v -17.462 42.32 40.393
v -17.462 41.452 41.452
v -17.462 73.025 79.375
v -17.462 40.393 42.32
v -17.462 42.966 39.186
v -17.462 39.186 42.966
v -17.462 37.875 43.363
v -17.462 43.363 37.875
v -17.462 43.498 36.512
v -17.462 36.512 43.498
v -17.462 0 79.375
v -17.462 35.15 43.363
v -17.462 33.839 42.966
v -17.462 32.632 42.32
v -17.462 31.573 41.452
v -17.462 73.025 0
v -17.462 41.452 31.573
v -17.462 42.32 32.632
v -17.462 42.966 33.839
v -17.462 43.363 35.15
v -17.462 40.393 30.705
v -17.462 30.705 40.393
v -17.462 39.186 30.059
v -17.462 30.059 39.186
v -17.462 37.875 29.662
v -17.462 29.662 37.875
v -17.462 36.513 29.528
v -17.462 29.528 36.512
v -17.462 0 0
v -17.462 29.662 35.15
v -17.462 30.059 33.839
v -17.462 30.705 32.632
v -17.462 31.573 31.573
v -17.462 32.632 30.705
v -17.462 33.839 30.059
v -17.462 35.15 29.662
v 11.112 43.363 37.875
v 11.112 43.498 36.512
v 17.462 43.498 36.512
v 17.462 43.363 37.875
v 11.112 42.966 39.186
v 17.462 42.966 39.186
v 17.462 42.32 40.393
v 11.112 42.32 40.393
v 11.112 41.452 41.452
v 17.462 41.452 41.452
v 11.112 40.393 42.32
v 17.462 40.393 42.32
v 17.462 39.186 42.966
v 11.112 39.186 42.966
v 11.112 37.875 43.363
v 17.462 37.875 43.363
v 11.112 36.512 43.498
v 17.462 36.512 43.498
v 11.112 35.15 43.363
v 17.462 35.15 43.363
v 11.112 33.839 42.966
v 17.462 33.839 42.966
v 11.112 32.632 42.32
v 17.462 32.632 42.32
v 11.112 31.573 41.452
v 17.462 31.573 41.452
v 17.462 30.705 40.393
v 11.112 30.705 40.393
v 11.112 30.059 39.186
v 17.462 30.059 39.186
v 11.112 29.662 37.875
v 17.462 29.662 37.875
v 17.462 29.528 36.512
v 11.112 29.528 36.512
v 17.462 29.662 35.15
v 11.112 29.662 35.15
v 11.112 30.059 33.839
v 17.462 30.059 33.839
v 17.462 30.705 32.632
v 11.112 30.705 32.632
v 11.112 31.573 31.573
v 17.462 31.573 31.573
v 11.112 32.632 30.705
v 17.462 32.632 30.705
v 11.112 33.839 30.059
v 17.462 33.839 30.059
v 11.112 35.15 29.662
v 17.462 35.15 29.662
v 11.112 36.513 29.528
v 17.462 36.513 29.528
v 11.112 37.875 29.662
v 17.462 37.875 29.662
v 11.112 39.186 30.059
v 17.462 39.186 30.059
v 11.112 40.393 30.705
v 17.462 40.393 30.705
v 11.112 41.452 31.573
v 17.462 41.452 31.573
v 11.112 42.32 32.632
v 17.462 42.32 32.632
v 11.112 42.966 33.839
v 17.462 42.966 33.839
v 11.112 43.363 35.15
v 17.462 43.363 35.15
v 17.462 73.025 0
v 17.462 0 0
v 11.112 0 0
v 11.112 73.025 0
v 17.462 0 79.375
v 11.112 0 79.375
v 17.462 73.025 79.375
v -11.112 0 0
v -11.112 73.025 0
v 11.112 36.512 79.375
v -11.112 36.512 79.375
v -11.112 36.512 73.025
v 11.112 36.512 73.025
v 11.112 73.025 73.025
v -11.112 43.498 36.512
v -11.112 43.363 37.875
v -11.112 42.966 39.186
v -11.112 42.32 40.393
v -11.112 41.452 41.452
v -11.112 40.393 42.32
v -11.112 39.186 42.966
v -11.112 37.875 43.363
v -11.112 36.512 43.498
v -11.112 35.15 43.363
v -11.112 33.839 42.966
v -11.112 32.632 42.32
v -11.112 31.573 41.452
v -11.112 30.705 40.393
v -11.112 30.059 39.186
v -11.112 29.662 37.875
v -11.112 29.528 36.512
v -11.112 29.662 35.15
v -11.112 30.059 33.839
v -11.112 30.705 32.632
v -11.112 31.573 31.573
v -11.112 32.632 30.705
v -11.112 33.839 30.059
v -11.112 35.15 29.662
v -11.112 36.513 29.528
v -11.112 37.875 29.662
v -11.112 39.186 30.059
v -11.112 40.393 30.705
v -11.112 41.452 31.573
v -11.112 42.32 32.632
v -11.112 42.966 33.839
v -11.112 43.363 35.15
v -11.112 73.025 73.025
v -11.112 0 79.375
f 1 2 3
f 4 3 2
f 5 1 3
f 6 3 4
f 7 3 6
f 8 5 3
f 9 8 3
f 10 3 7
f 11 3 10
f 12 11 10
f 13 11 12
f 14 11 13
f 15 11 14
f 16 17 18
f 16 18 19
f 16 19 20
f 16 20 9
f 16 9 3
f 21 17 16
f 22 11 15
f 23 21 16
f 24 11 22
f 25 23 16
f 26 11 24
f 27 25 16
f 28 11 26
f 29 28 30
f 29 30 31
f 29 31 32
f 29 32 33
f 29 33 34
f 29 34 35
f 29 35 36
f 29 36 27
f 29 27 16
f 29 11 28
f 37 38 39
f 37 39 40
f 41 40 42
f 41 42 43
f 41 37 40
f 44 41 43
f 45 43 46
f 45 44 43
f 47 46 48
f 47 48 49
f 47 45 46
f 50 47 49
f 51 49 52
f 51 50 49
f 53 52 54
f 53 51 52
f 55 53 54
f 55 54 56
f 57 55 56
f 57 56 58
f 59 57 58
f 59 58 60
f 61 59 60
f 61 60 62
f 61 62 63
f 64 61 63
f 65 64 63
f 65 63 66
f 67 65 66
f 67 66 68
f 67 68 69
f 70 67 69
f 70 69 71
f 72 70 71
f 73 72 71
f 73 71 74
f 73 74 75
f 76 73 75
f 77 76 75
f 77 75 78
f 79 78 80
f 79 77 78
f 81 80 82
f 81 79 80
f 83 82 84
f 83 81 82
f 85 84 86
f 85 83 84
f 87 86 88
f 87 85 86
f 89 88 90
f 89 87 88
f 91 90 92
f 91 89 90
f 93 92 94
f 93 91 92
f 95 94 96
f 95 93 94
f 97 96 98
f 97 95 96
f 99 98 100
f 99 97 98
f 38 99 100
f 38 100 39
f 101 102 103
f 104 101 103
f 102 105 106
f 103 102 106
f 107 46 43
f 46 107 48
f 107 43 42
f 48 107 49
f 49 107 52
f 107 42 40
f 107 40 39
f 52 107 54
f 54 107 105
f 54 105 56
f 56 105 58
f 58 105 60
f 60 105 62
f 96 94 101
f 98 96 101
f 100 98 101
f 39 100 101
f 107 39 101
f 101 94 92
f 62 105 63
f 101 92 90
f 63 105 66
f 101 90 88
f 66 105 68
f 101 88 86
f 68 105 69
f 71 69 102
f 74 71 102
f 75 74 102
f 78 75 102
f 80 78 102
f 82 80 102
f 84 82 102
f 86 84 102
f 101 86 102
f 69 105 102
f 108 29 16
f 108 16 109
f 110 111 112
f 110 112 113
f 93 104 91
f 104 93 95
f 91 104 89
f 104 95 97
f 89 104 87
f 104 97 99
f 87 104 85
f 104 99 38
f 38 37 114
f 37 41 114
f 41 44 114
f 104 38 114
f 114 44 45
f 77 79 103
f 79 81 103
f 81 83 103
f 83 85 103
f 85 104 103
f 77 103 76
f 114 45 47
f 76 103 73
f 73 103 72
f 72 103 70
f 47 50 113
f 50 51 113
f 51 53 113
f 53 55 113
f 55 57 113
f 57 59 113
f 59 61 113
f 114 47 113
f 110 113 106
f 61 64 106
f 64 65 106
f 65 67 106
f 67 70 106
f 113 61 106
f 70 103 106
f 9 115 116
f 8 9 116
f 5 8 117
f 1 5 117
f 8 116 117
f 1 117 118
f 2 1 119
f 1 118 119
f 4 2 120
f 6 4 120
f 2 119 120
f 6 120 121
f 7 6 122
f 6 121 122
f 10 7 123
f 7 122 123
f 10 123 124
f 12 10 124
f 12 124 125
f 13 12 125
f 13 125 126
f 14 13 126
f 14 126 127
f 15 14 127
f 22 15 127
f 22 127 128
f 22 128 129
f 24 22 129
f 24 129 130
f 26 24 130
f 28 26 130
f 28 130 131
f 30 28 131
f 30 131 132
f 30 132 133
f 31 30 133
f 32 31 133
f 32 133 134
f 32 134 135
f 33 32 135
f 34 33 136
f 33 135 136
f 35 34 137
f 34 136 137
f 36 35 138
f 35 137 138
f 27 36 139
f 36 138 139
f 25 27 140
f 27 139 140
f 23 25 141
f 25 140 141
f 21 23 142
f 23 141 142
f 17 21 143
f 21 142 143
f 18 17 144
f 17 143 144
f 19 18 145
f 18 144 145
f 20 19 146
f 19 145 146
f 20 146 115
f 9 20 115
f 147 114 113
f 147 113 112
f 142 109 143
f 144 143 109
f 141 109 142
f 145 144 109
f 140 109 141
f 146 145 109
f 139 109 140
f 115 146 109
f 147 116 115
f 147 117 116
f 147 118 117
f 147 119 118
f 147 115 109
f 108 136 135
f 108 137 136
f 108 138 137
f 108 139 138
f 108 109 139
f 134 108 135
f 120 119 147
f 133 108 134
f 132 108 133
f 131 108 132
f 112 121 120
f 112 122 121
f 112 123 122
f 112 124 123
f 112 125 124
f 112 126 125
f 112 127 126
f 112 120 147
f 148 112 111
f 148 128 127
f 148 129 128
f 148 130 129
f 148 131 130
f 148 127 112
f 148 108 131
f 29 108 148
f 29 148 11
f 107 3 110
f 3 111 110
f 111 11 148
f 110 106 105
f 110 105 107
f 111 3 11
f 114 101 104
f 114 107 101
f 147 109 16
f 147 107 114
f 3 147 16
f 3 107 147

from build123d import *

# Parameters (mm, degrees)
F1_DEPTH = 73.025
F2_R     = 6.985
F3_DEPTH = 25.4
F5_W     = 22.225
F5_H     = 36.5125
F6_DEPTH = 25.4


with BuildPart() as f1:
    # F0 (on Front) → F1 (new body)
    with BuildSketch(Plane.XZ):
        Polygon((-17.4625, 0), (-11.1125, 0), (-11.1125, 73.025), (0, 73.025), (0, 79.375), (-17.4625, 79.375), align=None)
    extrude(amount=-F1_DEPTH)

    # F2 (on face) → F3 (cut)
    with BuildSketch(Plane.YZ.offset(-11.1125)):
        with Locations((36.5125, 36.5125)):
            Circle(F2_R)
    extrude(amount=-F3_DEPTH, mode=Mode.SUBTRACT)

    # F4: F1 across plane


with BuildPart() as f1_1:
    add(f1.part)
    add(f1.part.mirror(Plane.YZ))

    # F5 (on face) → F6 (cut)
    with BuildSketch(Plane.XY.offset(79.375)):
        with Locations((0, 18.25625)):
            Rectangle(F5_W, F5_H)
    extrude(amount=-F6_DEPTH, mode=Mode.SUBTRACT)


solid = f1_1.part
